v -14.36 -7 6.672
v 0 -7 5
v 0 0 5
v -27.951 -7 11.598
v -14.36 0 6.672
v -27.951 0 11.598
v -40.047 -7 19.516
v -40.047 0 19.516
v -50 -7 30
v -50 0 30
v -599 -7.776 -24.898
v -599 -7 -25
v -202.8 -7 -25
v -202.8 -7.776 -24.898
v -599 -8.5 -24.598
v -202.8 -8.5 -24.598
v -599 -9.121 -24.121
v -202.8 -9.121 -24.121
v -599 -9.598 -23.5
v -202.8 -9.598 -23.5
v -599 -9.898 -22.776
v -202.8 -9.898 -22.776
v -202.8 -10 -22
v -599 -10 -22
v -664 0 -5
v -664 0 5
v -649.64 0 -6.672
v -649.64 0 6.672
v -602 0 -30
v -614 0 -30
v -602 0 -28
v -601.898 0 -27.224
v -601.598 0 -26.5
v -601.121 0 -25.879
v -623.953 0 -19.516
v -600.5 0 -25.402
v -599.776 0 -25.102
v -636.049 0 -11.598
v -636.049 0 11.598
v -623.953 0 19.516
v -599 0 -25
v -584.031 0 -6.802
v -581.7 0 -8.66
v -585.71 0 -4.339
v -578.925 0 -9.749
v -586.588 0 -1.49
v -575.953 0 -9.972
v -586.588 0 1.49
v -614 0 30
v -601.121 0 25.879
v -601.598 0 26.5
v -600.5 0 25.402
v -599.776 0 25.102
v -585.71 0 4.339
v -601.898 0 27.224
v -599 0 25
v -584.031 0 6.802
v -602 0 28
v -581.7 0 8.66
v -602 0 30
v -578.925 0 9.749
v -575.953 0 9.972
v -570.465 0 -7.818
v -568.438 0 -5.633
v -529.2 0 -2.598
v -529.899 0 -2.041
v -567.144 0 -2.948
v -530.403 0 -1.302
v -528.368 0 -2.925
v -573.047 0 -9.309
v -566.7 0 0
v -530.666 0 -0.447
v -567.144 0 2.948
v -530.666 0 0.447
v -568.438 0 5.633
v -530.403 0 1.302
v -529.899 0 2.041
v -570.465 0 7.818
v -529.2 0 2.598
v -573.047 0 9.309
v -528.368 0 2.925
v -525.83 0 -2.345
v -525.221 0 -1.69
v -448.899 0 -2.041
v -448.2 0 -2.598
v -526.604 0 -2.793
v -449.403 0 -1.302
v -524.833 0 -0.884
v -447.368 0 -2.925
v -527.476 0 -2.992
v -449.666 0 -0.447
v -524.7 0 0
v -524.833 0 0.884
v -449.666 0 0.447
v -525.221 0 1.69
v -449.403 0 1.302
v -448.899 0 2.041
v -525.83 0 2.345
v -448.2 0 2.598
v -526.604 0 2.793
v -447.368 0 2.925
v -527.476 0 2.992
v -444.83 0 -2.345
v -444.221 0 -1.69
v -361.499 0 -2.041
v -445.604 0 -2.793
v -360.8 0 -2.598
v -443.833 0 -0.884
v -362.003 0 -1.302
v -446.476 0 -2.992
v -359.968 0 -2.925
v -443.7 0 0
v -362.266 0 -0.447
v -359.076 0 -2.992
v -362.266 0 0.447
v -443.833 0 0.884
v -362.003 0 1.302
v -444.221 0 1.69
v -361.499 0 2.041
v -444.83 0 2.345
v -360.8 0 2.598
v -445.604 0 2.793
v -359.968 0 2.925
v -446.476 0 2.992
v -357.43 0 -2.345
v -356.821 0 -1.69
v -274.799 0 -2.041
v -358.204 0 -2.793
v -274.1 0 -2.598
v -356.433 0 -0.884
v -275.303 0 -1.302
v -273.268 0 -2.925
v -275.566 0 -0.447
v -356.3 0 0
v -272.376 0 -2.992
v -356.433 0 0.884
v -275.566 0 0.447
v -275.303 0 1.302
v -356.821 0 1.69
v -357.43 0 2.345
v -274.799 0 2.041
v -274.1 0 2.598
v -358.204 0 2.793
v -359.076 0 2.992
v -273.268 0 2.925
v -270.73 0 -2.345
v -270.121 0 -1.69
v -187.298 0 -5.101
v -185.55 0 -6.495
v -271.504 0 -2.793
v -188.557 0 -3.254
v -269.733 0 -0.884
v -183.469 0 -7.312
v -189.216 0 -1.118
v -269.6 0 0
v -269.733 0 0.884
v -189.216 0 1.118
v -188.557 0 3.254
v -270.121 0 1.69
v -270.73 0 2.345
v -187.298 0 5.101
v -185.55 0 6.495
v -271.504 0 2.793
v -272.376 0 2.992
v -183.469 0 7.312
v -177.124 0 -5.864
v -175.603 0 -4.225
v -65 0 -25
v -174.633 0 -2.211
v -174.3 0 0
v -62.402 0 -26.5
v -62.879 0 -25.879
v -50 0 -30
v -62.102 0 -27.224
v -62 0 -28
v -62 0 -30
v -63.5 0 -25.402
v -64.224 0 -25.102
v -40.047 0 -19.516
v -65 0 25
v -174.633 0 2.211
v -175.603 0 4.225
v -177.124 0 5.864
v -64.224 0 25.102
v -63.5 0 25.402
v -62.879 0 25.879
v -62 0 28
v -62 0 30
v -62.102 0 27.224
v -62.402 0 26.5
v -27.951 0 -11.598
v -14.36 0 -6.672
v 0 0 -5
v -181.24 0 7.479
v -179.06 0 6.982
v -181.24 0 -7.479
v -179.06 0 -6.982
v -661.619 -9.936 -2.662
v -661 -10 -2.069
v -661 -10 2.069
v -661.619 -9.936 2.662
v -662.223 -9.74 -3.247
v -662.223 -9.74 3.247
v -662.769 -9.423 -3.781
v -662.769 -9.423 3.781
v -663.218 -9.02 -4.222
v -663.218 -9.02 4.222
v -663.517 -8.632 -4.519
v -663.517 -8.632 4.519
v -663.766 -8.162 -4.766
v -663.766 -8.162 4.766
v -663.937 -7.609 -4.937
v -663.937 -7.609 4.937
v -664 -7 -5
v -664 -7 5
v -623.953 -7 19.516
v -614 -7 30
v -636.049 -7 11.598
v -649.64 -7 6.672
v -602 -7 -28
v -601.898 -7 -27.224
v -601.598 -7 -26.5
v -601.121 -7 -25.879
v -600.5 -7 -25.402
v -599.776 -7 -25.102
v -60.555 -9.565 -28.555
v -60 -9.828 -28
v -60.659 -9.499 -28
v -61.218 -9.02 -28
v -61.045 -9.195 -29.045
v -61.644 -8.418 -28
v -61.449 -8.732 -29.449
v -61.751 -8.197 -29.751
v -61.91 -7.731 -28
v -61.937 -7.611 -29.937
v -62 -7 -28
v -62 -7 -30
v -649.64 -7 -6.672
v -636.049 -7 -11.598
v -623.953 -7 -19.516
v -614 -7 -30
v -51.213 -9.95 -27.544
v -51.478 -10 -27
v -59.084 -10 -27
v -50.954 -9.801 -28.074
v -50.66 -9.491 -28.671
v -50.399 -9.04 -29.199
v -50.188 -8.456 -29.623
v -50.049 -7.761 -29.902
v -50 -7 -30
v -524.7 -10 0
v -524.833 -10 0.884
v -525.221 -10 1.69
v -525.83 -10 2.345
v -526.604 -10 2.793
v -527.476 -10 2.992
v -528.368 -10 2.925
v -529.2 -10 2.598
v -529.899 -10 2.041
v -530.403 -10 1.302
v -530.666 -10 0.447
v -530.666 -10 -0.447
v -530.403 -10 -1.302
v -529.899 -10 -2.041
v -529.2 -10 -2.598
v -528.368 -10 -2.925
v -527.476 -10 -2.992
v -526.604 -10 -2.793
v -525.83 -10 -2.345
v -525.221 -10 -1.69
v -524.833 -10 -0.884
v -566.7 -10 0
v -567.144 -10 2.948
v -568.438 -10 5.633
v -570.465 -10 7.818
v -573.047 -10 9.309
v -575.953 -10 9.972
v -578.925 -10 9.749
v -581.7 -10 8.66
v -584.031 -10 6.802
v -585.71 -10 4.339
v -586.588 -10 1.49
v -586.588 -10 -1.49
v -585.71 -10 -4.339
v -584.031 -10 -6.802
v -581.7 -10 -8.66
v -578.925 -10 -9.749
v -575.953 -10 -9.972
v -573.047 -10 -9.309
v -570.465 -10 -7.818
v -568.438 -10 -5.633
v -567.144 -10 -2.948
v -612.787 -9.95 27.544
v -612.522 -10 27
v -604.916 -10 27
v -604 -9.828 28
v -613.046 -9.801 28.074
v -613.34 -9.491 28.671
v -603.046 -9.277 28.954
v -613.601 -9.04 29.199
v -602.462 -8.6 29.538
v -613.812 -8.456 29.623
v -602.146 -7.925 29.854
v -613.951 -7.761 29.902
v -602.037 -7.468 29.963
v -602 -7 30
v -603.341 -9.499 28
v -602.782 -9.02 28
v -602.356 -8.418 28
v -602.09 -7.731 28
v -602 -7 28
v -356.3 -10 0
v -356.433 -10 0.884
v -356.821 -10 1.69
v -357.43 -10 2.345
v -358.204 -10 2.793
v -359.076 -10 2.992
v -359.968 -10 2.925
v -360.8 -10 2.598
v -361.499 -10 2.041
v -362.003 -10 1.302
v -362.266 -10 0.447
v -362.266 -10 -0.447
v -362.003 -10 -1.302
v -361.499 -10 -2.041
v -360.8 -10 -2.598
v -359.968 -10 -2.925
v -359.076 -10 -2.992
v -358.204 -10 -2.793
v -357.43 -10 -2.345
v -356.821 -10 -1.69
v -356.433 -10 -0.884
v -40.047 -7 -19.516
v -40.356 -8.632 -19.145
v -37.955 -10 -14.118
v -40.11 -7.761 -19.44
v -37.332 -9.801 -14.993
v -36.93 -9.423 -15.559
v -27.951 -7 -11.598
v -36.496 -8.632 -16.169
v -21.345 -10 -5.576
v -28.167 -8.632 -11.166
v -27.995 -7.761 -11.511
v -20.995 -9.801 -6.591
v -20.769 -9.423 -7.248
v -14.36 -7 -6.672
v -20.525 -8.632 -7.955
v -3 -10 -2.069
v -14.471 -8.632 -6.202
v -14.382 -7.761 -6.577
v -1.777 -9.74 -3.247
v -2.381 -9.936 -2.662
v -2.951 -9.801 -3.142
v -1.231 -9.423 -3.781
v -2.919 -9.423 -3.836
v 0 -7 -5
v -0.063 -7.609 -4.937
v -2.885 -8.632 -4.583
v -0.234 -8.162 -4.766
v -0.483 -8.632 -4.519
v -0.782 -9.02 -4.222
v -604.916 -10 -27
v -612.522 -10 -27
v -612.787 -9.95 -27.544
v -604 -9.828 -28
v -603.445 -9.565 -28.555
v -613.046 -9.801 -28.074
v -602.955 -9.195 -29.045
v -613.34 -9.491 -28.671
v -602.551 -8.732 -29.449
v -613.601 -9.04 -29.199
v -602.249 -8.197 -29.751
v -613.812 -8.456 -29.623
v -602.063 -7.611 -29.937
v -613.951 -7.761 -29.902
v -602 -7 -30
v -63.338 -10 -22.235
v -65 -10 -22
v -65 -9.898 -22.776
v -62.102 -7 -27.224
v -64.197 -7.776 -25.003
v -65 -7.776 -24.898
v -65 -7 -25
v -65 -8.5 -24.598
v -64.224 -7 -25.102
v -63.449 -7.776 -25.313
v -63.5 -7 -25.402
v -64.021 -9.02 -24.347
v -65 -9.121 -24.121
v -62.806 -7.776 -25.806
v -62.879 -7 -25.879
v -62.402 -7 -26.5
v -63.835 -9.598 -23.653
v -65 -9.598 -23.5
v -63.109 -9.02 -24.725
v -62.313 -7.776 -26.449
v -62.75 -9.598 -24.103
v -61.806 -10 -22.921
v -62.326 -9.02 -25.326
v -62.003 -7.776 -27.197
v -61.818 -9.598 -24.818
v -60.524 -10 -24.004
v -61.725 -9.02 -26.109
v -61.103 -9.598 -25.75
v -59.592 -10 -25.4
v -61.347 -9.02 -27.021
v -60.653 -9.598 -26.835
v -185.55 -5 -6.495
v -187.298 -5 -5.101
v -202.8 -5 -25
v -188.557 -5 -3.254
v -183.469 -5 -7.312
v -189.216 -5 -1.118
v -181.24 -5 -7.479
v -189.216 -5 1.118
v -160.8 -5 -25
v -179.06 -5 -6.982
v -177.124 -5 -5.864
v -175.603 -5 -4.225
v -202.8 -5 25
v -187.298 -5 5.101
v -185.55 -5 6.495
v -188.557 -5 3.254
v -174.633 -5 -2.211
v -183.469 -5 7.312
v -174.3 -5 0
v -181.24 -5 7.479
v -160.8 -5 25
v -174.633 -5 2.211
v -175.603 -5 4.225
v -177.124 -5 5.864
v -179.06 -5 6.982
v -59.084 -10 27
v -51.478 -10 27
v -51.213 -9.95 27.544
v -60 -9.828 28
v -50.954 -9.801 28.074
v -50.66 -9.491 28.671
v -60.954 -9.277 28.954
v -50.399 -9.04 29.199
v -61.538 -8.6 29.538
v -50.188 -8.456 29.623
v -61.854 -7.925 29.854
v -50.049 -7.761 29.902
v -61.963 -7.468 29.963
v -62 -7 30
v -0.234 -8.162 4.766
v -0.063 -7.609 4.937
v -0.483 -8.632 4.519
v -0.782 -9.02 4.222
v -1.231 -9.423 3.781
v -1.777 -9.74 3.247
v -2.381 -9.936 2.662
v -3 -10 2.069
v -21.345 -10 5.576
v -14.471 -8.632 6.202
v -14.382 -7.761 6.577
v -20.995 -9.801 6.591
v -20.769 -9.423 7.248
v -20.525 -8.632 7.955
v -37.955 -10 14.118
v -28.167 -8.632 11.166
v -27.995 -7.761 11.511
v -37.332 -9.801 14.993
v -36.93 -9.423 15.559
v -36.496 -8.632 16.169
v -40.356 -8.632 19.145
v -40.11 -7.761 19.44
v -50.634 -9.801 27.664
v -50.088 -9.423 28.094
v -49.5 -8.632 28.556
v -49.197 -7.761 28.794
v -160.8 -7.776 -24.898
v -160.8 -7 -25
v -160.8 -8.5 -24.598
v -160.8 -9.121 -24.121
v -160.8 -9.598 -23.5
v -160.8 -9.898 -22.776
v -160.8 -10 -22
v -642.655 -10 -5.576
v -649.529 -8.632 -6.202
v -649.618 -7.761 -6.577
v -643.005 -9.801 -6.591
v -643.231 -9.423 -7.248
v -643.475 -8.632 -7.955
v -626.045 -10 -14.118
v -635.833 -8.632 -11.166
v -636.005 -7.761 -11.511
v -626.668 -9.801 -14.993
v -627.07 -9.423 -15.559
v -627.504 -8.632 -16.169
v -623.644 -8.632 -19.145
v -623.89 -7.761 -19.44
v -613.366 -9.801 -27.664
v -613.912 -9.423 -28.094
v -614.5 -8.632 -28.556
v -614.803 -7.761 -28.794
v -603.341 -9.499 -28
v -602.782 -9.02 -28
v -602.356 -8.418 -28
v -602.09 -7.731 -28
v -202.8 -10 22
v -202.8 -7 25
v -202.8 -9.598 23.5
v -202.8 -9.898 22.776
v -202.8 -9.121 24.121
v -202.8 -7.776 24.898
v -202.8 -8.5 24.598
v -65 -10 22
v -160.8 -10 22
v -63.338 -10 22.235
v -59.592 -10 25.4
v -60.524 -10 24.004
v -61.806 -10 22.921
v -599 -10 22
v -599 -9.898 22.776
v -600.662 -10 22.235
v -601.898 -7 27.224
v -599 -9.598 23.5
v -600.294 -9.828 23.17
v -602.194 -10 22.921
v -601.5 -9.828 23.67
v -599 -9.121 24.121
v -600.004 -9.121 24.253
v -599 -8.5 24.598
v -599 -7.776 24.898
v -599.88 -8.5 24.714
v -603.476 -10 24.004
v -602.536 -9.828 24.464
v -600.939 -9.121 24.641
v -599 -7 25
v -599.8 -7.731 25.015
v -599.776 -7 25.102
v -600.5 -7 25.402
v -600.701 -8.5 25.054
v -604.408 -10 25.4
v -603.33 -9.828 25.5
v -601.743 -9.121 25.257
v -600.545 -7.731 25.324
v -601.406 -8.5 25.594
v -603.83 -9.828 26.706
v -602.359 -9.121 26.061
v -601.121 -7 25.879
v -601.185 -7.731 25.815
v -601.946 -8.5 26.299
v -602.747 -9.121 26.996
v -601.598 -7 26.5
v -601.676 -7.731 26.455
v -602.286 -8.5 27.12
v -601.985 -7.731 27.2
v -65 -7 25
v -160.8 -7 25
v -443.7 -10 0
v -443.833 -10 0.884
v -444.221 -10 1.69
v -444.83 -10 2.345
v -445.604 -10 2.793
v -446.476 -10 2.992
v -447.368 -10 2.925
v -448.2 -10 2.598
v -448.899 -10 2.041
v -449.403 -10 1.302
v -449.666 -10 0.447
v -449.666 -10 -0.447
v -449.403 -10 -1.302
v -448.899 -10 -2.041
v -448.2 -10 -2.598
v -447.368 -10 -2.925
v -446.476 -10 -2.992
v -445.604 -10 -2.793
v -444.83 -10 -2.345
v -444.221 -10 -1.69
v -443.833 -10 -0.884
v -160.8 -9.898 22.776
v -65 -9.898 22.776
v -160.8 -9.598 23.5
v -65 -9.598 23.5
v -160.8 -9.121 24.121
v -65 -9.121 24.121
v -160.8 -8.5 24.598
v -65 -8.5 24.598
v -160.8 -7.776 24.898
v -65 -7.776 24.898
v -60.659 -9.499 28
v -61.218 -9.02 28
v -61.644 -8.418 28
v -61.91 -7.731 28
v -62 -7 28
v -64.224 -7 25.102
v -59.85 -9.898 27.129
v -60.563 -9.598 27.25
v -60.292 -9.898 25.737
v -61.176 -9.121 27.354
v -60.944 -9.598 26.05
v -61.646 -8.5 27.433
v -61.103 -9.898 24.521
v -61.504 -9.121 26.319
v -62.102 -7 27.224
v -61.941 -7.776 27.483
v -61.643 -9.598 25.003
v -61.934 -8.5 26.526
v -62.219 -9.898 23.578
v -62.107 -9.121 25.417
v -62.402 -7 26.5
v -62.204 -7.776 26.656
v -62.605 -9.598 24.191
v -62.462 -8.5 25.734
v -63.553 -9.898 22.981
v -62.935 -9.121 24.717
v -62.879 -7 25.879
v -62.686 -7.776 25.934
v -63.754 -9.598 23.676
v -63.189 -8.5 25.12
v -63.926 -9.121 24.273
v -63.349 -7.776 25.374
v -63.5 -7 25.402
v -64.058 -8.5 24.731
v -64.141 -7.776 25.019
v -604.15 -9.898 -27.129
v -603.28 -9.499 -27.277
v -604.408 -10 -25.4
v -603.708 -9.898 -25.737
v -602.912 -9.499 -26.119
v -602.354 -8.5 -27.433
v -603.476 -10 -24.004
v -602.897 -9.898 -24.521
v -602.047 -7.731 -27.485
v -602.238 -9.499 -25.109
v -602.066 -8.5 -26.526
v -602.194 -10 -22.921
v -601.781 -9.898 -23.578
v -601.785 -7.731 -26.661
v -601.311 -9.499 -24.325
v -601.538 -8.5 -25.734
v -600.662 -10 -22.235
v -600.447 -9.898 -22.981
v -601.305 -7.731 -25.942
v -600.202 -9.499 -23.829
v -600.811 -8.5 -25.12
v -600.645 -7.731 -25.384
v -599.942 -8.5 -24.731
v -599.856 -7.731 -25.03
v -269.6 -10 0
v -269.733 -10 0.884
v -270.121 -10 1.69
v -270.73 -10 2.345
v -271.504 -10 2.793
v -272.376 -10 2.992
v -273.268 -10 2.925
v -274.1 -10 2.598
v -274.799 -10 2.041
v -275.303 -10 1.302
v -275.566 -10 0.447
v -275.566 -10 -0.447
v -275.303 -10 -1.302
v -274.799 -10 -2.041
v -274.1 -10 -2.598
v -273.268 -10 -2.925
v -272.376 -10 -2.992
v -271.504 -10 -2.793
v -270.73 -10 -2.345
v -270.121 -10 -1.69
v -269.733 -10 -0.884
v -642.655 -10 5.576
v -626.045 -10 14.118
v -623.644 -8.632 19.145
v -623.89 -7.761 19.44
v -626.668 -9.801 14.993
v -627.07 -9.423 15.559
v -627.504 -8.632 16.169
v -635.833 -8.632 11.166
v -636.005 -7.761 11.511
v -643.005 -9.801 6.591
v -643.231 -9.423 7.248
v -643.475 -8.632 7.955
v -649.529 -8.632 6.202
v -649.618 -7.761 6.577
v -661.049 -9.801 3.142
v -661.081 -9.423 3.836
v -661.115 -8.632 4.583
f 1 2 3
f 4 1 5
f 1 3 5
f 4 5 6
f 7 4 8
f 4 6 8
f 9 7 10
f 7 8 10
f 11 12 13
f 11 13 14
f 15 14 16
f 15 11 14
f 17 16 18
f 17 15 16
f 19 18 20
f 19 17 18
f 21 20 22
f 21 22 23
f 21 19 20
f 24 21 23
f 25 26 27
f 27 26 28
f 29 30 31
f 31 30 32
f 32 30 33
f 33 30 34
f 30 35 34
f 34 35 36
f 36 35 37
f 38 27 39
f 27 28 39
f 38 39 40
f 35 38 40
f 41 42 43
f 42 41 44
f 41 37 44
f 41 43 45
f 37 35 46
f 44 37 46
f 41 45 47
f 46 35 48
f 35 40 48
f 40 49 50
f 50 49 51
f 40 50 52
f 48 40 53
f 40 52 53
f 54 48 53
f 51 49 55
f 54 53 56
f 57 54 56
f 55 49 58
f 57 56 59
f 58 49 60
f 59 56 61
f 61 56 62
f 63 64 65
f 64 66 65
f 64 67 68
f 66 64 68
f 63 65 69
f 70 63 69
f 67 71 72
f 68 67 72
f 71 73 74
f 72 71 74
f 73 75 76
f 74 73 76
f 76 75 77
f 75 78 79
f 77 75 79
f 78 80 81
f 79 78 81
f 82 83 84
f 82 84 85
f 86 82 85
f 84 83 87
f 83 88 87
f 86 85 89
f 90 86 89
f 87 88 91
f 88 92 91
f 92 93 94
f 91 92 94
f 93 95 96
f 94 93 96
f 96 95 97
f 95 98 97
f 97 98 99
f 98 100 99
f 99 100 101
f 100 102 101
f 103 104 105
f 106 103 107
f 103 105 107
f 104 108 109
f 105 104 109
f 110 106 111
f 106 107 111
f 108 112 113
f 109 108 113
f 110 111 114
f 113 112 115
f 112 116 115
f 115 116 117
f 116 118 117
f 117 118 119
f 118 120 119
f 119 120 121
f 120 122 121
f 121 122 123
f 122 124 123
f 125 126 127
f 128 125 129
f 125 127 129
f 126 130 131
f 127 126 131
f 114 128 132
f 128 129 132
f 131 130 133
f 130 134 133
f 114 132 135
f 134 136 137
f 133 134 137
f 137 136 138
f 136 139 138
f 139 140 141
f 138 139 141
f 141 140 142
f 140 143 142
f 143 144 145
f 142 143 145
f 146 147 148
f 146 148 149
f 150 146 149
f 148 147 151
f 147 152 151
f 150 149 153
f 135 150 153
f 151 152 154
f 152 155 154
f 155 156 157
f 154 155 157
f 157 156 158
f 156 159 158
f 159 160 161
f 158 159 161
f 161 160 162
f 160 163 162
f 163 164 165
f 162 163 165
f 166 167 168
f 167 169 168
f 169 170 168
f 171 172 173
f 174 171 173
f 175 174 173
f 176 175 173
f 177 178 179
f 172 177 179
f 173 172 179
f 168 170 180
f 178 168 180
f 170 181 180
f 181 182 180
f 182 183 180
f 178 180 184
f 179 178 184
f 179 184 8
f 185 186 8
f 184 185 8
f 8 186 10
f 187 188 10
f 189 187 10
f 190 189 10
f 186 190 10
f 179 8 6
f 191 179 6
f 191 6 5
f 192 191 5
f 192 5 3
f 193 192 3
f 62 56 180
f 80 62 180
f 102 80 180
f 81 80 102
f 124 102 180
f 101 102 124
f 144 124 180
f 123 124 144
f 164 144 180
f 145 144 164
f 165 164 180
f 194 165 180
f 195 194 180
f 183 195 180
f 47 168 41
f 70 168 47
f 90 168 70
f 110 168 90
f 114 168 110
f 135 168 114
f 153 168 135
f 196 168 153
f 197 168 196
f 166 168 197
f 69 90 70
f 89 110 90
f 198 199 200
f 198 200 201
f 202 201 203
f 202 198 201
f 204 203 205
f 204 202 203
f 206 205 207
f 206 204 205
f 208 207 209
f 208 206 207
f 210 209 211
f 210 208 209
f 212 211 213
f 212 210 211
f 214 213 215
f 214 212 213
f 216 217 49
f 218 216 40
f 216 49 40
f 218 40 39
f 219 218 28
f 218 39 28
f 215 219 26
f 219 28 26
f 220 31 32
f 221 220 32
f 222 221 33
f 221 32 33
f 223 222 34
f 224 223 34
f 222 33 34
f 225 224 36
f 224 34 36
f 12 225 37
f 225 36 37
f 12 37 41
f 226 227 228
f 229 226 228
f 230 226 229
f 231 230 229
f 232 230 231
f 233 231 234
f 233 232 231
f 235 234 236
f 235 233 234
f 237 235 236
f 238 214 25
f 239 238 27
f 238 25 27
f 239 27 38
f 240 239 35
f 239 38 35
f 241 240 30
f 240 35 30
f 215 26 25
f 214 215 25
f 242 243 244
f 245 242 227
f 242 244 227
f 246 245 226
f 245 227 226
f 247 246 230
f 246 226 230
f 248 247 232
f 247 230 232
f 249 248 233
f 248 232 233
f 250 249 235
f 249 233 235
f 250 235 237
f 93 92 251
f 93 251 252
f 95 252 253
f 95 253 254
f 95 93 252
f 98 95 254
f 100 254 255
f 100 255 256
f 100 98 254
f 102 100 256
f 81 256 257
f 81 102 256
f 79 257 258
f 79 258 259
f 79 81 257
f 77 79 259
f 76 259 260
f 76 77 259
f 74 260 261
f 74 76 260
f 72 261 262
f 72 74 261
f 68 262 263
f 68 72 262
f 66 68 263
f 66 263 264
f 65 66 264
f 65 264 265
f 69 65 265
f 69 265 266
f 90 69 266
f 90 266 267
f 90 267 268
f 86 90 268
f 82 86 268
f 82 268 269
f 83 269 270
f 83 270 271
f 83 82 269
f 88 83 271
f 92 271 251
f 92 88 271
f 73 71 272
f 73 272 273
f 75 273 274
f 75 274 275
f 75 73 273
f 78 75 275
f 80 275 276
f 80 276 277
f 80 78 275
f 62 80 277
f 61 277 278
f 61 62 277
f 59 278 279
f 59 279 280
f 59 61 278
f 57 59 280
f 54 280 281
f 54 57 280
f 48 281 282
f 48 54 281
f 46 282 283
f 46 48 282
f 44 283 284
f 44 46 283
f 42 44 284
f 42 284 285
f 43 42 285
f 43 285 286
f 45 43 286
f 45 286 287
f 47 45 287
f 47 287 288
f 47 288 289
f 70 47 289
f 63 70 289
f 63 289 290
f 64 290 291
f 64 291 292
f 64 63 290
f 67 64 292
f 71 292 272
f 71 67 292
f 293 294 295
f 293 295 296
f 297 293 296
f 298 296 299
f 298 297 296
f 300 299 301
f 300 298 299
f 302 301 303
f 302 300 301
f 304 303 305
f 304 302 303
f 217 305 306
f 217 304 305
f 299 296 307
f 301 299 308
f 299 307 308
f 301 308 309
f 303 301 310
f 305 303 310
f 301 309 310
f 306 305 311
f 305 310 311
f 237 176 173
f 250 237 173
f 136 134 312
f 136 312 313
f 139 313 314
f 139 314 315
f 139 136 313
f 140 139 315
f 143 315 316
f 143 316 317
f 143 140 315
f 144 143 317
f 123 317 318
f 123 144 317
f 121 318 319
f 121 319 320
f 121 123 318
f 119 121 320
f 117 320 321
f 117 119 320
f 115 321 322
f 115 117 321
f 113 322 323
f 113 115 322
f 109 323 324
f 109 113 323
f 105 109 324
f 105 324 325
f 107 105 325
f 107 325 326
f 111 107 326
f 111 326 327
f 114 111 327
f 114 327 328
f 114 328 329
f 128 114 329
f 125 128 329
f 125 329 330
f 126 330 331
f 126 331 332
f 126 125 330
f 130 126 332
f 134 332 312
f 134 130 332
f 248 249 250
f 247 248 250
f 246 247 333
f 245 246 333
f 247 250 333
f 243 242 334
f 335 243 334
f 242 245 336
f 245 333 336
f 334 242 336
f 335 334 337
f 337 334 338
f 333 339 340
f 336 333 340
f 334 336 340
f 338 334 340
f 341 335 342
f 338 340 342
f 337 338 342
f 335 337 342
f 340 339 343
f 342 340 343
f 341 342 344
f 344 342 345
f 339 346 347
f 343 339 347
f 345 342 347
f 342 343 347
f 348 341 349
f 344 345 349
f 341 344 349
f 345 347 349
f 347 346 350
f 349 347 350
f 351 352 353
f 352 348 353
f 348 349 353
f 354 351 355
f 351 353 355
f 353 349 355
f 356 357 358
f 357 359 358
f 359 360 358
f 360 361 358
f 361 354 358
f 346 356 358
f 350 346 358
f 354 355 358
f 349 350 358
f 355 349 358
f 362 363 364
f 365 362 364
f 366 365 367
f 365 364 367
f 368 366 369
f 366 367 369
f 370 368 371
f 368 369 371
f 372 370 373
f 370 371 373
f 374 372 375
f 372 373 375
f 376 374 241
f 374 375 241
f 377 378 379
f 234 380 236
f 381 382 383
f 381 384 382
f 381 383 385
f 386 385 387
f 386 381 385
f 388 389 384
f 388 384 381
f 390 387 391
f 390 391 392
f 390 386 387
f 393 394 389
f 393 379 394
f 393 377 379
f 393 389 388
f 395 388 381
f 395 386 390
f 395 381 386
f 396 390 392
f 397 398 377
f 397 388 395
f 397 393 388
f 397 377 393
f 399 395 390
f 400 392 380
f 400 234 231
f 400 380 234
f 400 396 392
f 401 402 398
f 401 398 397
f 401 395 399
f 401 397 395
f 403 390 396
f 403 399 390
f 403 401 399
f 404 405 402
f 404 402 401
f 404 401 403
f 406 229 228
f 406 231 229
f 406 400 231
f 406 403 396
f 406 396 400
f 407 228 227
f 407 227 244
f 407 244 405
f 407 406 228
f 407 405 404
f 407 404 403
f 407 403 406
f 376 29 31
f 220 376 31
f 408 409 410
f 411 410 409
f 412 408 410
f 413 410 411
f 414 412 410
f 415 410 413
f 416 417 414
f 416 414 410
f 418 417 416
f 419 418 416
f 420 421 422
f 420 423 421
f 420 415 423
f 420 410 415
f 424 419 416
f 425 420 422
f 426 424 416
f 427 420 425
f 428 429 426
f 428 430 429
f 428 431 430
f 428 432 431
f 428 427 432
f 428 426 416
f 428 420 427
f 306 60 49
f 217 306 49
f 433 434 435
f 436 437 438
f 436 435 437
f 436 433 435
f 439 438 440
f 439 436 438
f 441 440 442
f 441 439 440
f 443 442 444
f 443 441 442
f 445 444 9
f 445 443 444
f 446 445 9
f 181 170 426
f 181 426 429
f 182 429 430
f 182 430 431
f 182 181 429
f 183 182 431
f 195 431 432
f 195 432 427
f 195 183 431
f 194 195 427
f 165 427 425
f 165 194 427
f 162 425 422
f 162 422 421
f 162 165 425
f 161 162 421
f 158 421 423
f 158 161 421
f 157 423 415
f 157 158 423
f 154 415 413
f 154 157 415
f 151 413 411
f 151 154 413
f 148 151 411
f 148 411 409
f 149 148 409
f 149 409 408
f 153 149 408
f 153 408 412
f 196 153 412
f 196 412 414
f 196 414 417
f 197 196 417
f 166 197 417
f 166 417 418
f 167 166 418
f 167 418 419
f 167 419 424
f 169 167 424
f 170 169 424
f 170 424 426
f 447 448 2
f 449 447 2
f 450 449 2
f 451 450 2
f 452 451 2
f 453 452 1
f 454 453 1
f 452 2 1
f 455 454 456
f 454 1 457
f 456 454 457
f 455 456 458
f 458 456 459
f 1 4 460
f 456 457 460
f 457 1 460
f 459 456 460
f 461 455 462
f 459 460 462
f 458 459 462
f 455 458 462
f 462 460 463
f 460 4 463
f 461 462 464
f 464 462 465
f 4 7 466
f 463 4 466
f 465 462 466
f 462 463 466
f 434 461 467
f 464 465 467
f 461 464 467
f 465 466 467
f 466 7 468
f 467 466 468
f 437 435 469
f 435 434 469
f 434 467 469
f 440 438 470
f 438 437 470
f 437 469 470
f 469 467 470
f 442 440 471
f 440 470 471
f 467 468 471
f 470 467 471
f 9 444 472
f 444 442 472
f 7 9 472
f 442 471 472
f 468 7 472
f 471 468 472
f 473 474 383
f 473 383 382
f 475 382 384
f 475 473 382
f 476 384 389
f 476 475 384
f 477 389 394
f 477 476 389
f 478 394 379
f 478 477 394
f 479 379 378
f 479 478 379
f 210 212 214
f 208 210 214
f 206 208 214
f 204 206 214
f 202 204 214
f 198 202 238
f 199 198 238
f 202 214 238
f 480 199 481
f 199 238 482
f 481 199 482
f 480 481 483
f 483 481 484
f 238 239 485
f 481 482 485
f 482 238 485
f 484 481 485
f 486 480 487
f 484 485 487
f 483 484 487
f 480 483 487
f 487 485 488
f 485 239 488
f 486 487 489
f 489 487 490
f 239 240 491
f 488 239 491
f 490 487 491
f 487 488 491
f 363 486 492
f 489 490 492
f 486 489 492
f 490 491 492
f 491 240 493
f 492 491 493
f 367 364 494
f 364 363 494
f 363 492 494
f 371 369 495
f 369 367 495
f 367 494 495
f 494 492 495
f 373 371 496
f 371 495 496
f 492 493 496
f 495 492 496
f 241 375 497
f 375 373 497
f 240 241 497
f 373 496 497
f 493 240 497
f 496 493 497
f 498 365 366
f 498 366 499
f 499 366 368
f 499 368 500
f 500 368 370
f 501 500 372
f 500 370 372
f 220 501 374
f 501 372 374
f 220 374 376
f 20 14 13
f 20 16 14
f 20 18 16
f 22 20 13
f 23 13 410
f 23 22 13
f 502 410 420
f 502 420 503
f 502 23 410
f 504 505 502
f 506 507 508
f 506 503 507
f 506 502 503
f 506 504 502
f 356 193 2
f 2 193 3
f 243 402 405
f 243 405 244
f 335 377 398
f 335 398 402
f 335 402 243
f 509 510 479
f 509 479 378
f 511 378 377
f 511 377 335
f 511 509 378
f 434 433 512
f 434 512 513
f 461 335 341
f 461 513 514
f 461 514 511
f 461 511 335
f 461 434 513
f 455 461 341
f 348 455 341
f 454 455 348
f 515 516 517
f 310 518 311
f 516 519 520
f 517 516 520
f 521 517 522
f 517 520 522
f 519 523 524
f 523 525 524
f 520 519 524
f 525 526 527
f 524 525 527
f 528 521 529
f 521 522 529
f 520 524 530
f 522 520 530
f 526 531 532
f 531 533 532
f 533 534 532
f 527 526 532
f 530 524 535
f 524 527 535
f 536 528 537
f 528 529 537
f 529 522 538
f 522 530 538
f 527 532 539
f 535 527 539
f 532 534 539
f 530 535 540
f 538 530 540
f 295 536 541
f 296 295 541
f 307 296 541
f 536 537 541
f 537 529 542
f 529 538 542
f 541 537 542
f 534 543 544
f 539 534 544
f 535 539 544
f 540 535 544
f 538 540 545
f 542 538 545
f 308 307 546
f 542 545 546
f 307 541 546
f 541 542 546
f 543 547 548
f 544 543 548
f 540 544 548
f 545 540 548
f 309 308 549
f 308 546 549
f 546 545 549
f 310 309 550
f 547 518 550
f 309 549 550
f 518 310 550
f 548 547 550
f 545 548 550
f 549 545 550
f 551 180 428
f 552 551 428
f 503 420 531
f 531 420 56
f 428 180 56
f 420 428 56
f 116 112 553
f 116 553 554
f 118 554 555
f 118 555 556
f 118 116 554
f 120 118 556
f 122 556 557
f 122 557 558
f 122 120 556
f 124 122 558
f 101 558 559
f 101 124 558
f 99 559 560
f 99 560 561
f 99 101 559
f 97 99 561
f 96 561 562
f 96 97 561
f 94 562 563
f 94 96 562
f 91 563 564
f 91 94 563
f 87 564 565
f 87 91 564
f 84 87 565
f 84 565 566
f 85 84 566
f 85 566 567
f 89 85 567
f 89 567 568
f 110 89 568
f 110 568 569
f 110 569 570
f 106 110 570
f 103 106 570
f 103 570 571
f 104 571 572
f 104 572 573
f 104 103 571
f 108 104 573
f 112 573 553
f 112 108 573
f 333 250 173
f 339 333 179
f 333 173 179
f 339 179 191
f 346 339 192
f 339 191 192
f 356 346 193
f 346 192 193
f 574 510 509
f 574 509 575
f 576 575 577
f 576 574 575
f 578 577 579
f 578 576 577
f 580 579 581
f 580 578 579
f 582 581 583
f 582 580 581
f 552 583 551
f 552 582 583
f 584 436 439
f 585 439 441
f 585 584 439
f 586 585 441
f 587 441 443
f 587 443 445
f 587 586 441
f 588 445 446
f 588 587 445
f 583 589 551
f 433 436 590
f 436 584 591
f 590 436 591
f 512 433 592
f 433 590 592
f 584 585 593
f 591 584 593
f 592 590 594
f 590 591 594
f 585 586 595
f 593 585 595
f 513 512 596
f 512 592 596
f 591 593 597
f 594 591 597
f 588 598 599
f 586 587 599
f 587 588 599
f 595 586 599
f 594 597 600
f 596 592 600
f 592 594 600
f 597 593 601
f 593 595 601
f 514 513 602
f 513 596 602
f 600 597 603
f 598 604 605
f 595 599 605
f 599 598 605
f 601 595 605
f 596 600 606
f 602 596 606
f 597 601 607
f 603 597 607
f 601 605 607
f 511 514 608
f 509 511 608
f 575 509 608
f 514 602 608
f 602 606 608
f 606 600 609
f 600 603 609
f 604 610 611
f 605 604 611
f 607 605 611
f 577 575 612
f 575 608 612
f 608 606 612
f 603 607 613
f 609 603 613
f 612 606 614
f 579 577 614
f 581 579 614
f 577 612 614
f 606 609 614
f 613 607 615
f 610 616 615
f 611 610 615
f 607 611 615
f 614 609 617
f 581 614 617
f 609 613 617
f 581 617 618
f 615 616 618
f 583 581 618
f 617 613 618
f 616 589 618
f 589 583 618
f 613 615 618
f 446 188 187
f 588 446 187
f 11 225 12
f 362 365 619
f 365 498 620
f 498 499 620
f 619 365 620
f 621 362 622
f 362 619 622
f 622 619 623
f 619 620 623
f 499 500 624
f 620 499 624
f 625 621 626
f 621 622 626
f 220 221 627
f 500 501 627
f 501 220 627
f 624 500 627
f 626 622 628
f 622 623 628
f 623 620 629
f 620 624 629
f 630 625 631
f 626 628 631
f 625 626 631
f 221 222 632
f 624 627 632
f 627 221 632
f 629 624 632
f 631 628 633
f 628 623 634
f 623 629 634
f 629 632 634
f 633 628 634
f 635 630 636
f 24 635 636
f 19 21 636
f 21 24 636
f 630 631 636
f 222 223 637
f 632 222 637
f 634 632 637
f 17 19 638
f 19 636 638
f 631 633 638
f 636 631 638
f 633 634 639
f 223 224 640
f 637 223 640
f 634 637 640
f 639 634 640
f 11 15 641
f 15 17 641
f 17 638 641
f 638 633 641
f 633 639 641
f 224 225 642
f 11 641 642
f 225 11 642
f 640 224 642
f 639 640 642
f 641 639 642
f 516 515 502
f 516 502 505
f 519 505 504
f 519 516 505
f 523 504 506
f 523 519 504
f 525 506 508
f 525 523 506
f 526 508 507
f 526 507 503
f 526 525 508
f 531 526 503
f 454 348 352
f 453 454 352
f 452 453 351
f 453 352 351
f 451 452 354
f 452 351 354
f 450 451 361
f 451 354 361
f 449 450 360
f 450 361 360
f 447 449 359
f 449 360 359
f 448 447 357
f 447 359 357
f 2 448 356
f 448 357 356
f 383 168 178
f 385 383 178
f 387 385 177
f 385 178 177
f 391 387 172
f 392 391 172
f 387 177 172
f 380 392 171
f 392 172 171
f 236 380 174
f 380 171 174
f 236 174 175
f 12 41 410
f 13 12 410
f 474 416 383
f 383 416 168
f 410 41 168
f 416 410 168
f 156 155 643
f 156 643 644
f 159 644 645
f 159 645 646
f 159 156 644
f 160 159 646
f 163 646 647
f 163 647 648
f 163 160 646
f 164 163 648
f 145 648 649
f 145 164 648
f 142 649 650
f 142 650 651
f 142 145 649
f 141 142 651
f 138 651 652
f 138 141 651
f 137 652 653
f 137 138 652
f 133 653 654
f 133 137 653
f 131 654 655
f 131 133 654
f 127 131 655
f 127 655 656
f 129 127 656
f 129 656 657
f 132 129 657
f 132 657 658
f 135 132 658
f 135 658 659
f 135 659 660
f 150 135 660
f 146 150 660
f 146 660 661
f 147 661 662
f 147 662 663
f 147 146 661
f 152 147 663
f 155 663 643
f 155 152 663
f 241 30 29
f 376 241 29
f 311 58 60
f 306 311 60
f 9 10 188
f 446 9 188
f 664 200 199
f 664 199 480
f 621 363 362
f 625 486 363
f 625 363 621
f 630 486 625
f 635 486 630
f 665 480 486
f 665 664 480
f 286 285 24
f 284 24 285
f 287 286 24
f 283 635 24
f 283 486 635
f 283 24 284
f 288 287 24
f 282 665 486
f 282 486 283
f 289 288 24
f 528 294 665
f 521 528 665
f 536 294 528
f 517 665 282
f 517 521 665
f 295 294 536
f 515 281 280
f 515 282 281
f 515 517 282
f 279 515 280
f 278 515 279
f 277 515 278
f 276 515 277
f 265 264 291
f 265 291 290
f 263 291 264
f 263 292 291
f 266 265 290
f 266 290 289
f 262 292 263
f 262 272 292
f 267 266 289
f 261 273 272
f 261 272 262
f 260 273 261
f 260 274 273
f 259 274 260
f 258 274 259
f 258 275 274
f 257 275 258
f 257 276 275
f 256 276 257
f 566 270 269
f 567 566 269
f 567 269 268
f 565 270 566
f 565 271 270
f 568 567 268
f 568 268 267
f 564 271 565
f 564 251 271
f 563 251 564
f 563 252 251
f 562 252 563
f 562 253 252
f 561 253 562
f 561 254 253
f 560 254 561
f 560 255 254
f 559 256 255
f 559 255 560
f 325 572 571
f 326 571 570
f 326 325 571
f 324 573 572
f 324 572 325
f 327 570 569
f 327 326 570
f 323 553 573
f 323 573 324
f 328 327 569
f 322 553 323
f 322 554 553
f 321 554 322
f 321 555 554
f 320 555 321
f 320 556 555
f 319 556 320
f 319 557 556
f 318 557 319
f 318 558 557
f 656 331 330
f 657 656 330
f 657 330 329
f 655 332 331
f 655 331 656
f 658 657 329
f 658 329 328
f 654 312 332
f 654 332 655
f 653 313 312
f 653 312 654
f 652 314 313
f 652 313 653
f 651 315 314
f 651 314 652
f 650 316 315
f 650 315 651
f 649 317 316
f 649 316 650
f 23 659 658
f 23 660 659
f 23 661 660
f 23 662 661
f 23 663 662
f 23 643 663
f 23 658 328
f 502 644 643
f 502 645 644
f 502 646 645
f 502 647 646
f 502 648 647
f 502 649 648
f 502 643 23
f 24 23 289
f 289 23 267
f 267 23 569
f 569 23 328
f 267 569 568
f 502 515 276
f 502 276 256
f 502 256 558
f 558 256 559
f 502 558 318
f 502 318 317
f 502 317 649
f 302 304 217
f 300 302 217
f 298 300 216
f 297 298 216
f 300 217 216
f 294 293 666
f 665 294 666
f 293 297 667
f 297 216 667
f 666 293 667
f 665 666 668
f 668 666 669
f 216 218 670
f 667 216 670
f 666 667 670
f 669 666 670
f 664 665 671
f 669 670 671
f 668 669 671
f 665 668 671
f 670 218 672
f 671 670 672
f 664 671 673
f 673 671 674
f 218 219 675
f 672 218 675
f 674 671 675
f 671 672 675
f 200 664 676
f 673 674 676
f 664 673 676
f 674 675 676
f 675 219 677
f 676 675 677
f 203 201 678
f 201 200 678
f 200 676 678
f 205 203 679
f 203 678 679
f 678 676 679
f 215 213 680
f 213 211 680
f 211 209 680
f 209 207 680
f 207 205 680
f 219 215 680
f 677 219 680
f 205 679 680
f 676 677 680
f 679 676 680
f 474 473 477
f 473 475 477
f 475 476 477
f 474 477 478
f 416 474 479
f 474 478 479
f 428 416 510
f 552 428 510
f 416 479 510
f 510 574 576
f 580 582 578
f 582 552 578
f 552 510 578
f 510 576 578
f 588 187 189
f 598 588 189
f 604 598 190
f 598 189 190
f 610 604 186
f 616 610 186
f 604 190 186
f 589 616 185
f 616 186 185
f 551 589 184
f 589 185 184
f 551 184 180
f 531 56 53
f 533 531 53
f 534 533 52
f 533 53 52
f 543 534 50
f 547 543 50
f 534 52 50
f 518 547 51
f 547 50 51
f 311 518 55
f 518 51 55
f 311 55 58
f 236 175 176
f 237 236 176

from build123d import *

# Parameters (mm, degrees)
F0_R         = 10
F0_R_2       = 3
F0_R_3       = 7.5
F1_DEPTH     = 10
F2_W         = 42
F2_H         = 50
F2_R         = 7.5
F3_DEPTH     = 5
F4_T1_DEPTH  = 403.7
F4_T3_DEPTH  = 103.3
F4_T5_DEPTH  = 27
F4_T7_DEPTH  = 25
F4_T9_DEPTH  = 27
F4_T11_DEPTH = 9.5
F4_T13_DEPTH = 9.5
F4_T16_ANGLE = 66.8830141294
F4_T18_ANGLE = 66.8830141294
F4_T20_ANGLE = 66.8830141294
F4_T22_ANGLE = 66.8830141294
F4_T24_ANGLE = 90
F4_T26_ANGLE = 90
F4_T28_ANGLE = 90
F4_T30_ANGLE = 90


# Not quite as in the source:
# - a fillet or chamfer that OpenCascade refuses, or shapes differently, is made with other operations: its cross-section is extruded or revolved along the edge and cut away or added


with BuildPart() as f1:
    # F0 (on Front) → F1 (new body)
    with BuildSketch(Plane.XZ):
        with BuildLine():
            Line((0, -5), (0, 0))
            Line((0, 0), (0, 5))
            ThreePointArc((0, 5), (-27.9508497187, 11.5983005625), (-50, 30))
            Line((-50, 30), (-62, 30))
            Line((-62, 30), (-62, 28))
            ThreePointArc((-62, 28), (-62.8786796564, 25.8786796564), (-65, 25))
            Line((-65, 25), (-332, 25))
            Line((-332, 25), (-599, 25))
            ThreePointArc((-599, 25), (-601.1213203436, 25.8786796564), (-602, 28))
            Line((-602, 28), (-602, 30))
            Line((-602, 30), (-614, 30))
            ThreePointArc((-614, 30), (-636.0491502813, 11.5983005625), (-664, 5))
            Line((-664, 5), (-664, 0))
            Line((-664, 0), (-664, -5))
            ThreePointArc((-664, -5), (-636.0491502813, -11.5983005625), (-614, -30))
            Line((-614, -30), (-602, -30))
            Line((-602, -30), (-602, -28))
            ThreePointArc((-602, -28), (-601.1213203436, -25.8786796564), (-599, -25))
            Line((-599, -25), (-332, -25))
            Line((-332, -25), (-65, -25))
            ThreePointArc((-65, -25), (-62.8786796564, -25.8786796564), (-62, -28))
            Line((-62, -28), (-62, -30))
            Line((-62, -30), (-50, -30))
            ThreePointArc((-50, -30), (-27.9508497187, -11.5983005625), (0, -5))
        make_face()
        with Locations((-576.7, 0)):
            Circle(F0_R, mode=Mode.SUBTRACT)
        with Locations((-527.7, 0)):
            Circle(F0_R_2, mode=Mode.SUBTRACT)
        with Locations((-446.7, 0)):
            Circle(F0_R_2, mode=Mode.SUBTRACT)
        with Locations((-359.3, 0)):
            Circle(F0_R_2, mode=Mode.SUBTRACT)
        with Locations((-272.6, 0)):
            Circle(F0_R_2, mode=Mode.SUBTRACT)
        with Locations((-181.8, 0)):
            Circle(F0_R_3, mode=Mode.SUBTRACT)
    extrude(amount=F1_DEPTH)

    # F2 (on face) → F3 (cut)
    with BuildSketch(Plane.XZ.offset(10)):
        with Locations((-181.8, 0)):
            Rectangle(F2_W, F2_H)
        with Locations((-181.8, 0)):
            Circle(F2_R, mode=Mode.SUBTRACT)
    extrude(amount=-F3_DEPTH, mode=Mode.SUBTRACT)

    # F4: fillet of radius 3 on 18 edges, made by hand

    # F4_s2 → F4_t1 (cut)
    with BuildSketch(Plane.YZ.offset(-599)):
        with BuildLine():
            ThreePointArc((-10, 22), (-9.1213203436, 24.1213203436), (-7, 25))
            Line((-7, 25), (-10, 25))
            Line((-10, 25), (-10, 22))
        make_face()
        with BuildLine():
            ThreePointArc((-7, -25), (-9.1213203436, -24.1213203436), (-10, -22))
            Line((-10, -22), (-10, -25))
            Line((-10, -25), (-7, -25))
        make_face()
    extrude(amount=F4_T1_DEPTH, mode=Mode.SUBTRACT)

    # F4_s4 → F4_t3 (cut)
    with BuildSketch(Plane.YZ.offset(-168.3)):
        with BuildLine():
            ThreePointArc((-7, -25), (-9.1213203436, -24.1213203436), (-10, -22))
            Line((-10, -22), (-10, -25))
            Line((-10, -25), (-7, -25))
        make_face()
        with BuildLine():
            ThreePointArc((-10, 22), (-9.1213203436, 24.1213203436), (-7, 25))
            Line((-7, 25), (-10, 25))
            Line((-10, 25), (-10, 22))
        make_face()
    extrude(amount=F4_T3_DEPTH, mode=Mode.SUBTRACT)

    # F4_s6 → F4_t5 (cut)
    with BuildSketch(Plane.YZ.offset(-69.5)):
        with BuildLine():
            ThreePointArc((-10, -27), (-9.1213203436, -29.1213203436), (-7, -30))
            Line((-7, -30), (-10, -30))
            Line((-10, -30), (-10, -27))
        make_face()
        with BuildLine():
            ThreePointArc((-10, 27), (-9.1213203436, 29.1213203436), (-7, 30))
            Line((-7, 30), (-10, 30))
            Line((-10, 30), (-10, 27))
        make_face()
    extrude(amount=F4_T5_DEPTH, mode=Mode.SUBTRACT)

    # F4_s8 → F4_t7 (cut)
    with BuildSketch(Plane.XY.offset(-12.5)):
        with BuildLine():
            ThreePointArc((-3, -10), (-0.8786796564, -9.1213203436), (0, -7))
            Line((0, -7), (0, -10))
            Line((0, -10), (-3, -10))
        make_face()
        with BuildLine():
            ThreePointArc((-661, -10), (-663.1213203436, -9.1213203436), (-664, -7))
            Line((-664, -7), (-664, -10))
            Line((-664, -10), (-661, -10))
        make_face()
    extrude(amount=F4_T7_DEPTH, mode=Mode.SUBTRACT)

    # F4_s10 → F4_t9 (cut)
    with BuildSketch(Plane.YZ.offset(-621.5)):
        with BuildLine():
            ThreePointArc((-10, -27), (-9.1213203436, -29.1213203436), (-7, -30))
            Line((-7, -30), (-10, -30))
            Line((-10, -30), (-10, -27))
        make_face()
        with BuildLine():
            ThreePointArc((-10, 27), (-9.1213203436, 29.1213203436), (-7, 30))
            Line((-7, 30), (-10, 30))
            Line((-10, 30), (-10, 27))
        make_face()
    extrude(amount=F4_T9_DEPTH, mode=Mode.SUBTRACT)

    # F4_s12 → F4_t11 (cut)
    with BuildSketch(Plane.XY.offset(28)):
        with BuildLine():
            ThreePointArc((-605, -10), (-602.8786796564, -9.1213203436), (-602, -7))
            Line((-602, -7), (-602, -10))
            Line((-602, -10), (-605, -10))
        make_face()
        with BuildLine():
            ThreePointArc((-59, -10), (-61.1213203436, -9.1213203436), (-62, -7))
            Line((-62, -7), (-62, -10))
            Line((-62, -10), (-59, -10))
        make_face()
    extrude(amount=F4_T11_DEPTH, mode=Mode.SUBTRACT)

    # F4_s14 → F4_t13 (cut)
    with BuildSketch(Plane.XY.offset(-37.5)):
        with BuildLine():
            ThreePointArc((-605, -10), (-602.8786796564, -9.1213203436), (-602, -7))
            Line((-602, -7), (-602, -10))
            Line((-602, -10), (-605, -10))
        make_face()
        with BuildLine():
            ThreePointArc((-59, -10), (-61.1213203436, -9.1213203436), (-62, -7))
            Line((-62, -7), (-62, -10))
            Line((-62, -10), (-59, -10))
        make_face()
    extrude(amount=F4_T13_DEPTH, mode=Mode.SUBTRACT)

    # F4_s15 → F4_t16 (revolve, cut)
    with BuildSketch(Plane(origin=(-29.2244934886, 0, -50.6316906835), x_dir=(0, 1, 0), z_dir=(-0.4999008689, 0, -0.8660826296))):
        with BuildLine():
            ThreePointArc((-10, -31.7566913469), (-9.1213203436, -29.6353710033), (-7, -28.7566913469))
            Line((-7, -28.7566913469), (-10, -28.7566913469))
            Line((-10, -28.7566913469), (-10, -31.7566913469))
        make_face()
    revolve(axis=Axis((0, -10, -67.5), (0, 1, 0)), revolution_arc=F4_T16_ANGLE, mode=Mode.SUBTRACT)

    # F4_s17 → F4_t18 (revolve, cut)
    with BuildSketch(Plane(origin=(8.0235648794, 0, 0.9676128596), x_dir=(0, 1, 0), z_dir=(0.992806625, 0, 0.1197288826))):
        with BuildLine():
            ThreePointArc((-10, 1.5144471885), (-9.1213203436, 3.6357675321), (-7, 4.5144471885))
            Line((-7, 4.5144471885), (-10, 4.5144471885))
            Line((-10, 4.5144471885), (-10, 1.5144471885))
        make_face()
    revolve(axis=Axis((0, -10, 67.5), (0, 1, 0)), revolution_arc=F4_T18_ANGLE, mode=Mode.SUBTRACT)

    # F4_s19 → F4_t20 (revolve, cut)
    with BuildSketch(Plane(origin=(-662.5051213425, 0, -79.8957177472), x_dir=(0, 1, 0), z_dir=(-0.992806625, 0, -0.1197288826))):
        with BuildLine():
            ThreePointArc((-10, -77.9855308525), (-9.1213203436, -75.864210509), (-7, -74.9855308525))
            Line((-7, -74.9855308525), (-10, -74.9855308525))
            Line((-10, -74.9855308525), (-10, -77.9855308525))
        make_face()
    revolve(axis=Axis((-664, -10, -67.5), (0, 1, 0)), revolution_arc=F4_T20_ANGLE, mode=Mode.SUBTRACT)

    # F4_s21 → F4_t22 (revolve, cut)
    with BuildSketch(Plane(origin=(-136.7096900096, 0, -236.8507341524), x_dir=(0, 1, 0), z_dir=(0.4999008689, 0, 0.8660826296))):
        with BuildLine():
            ThreePointArc((-10, 543.3221746856), (-9.1213203436, 545.4434950292), (-7, 546.3221746856))
            Line((-7, 546.3221746856), (-10, 546.3221746856))
            Line((-10, 546.3221746856), (-10, 543.3221746856))
        make_face()
    revolve(axis=Axis((-664, -10, 67.5), (0, 1, 0)), revolution_arc=F4_T22_ANGLE, mode=Mode.SUBTRACT)

    # F4_s23 → F4_t24 (revolve, cut)
    with BuildSketch(Plane.YZ.offset(-65)):
        with BuildLine():
            ThreePointArc((-7, -25), (-9.1213203436, -24.1213203436), (-10, -22))
            Line((-10, -22), (-10, -25))
            Line((-10, -25), (-7, -25))
        make_face()
    revolve(axis=Axis((-65, -10, -28), (0, 1, 0)), revolution_arc=F4_T24_ANGLE, mode=Mode.SUBTRACT)

    # F4_s25 → F4_t26 (revolve, cut)
    with BuildSketch(Plane.XY.offset(28)):
        with BuildLine():
            ThreePointArc((-59, -10), (-61.1213203436, -9.1213203436), (-62, -7))
            Line((-62, -7), (-62, -10))
            Line((-62, -10), (-59, -10))
        make_face()
    revolve(axis=Axis((-65, -10, 28), (0, 1, 0)), revolution_arc=F4_T26_ANGLE, mode=Mode.SUBTRACT)

    # F4_s27 → F4_t28 (revolve, cut)
    with BuildSketch(Plane.XY.offset(-28)):
        with BuildLine():
            ThreePointArc((-605, -10), (-602.8786796564, -9.1213203436), (-602, -7))
            Line((-602, -7), (-602, -10))
            Line((-602, -10), (-605, -10))
        make_face()
    revolve(axis=Axis((-599, -10, -28), (0, 1, 0)), revolution_arc=F4_T28_ANGLE, mode=Mode.SUBTRACT)

    # F4_s29 → F4_t30 (revolve, cut)
    with BuildSketch(Plane.YZ.offset(-599)):
        with BuildLine():
            ThreePointArc((-10, 22), (-9.1213203436, 24.1213203436), (-7, 25))
            Line((-7, 25), (-10, 25))
            Line((-10, 25), (-10, 22))
        make_face()
    revolve(axis=Axis((-599, -10, 28), (0, 1, 0)), revolution_arc=F4_T30_ANGLE, mode=Mode.SUBTRACT)


solid = f1.part
